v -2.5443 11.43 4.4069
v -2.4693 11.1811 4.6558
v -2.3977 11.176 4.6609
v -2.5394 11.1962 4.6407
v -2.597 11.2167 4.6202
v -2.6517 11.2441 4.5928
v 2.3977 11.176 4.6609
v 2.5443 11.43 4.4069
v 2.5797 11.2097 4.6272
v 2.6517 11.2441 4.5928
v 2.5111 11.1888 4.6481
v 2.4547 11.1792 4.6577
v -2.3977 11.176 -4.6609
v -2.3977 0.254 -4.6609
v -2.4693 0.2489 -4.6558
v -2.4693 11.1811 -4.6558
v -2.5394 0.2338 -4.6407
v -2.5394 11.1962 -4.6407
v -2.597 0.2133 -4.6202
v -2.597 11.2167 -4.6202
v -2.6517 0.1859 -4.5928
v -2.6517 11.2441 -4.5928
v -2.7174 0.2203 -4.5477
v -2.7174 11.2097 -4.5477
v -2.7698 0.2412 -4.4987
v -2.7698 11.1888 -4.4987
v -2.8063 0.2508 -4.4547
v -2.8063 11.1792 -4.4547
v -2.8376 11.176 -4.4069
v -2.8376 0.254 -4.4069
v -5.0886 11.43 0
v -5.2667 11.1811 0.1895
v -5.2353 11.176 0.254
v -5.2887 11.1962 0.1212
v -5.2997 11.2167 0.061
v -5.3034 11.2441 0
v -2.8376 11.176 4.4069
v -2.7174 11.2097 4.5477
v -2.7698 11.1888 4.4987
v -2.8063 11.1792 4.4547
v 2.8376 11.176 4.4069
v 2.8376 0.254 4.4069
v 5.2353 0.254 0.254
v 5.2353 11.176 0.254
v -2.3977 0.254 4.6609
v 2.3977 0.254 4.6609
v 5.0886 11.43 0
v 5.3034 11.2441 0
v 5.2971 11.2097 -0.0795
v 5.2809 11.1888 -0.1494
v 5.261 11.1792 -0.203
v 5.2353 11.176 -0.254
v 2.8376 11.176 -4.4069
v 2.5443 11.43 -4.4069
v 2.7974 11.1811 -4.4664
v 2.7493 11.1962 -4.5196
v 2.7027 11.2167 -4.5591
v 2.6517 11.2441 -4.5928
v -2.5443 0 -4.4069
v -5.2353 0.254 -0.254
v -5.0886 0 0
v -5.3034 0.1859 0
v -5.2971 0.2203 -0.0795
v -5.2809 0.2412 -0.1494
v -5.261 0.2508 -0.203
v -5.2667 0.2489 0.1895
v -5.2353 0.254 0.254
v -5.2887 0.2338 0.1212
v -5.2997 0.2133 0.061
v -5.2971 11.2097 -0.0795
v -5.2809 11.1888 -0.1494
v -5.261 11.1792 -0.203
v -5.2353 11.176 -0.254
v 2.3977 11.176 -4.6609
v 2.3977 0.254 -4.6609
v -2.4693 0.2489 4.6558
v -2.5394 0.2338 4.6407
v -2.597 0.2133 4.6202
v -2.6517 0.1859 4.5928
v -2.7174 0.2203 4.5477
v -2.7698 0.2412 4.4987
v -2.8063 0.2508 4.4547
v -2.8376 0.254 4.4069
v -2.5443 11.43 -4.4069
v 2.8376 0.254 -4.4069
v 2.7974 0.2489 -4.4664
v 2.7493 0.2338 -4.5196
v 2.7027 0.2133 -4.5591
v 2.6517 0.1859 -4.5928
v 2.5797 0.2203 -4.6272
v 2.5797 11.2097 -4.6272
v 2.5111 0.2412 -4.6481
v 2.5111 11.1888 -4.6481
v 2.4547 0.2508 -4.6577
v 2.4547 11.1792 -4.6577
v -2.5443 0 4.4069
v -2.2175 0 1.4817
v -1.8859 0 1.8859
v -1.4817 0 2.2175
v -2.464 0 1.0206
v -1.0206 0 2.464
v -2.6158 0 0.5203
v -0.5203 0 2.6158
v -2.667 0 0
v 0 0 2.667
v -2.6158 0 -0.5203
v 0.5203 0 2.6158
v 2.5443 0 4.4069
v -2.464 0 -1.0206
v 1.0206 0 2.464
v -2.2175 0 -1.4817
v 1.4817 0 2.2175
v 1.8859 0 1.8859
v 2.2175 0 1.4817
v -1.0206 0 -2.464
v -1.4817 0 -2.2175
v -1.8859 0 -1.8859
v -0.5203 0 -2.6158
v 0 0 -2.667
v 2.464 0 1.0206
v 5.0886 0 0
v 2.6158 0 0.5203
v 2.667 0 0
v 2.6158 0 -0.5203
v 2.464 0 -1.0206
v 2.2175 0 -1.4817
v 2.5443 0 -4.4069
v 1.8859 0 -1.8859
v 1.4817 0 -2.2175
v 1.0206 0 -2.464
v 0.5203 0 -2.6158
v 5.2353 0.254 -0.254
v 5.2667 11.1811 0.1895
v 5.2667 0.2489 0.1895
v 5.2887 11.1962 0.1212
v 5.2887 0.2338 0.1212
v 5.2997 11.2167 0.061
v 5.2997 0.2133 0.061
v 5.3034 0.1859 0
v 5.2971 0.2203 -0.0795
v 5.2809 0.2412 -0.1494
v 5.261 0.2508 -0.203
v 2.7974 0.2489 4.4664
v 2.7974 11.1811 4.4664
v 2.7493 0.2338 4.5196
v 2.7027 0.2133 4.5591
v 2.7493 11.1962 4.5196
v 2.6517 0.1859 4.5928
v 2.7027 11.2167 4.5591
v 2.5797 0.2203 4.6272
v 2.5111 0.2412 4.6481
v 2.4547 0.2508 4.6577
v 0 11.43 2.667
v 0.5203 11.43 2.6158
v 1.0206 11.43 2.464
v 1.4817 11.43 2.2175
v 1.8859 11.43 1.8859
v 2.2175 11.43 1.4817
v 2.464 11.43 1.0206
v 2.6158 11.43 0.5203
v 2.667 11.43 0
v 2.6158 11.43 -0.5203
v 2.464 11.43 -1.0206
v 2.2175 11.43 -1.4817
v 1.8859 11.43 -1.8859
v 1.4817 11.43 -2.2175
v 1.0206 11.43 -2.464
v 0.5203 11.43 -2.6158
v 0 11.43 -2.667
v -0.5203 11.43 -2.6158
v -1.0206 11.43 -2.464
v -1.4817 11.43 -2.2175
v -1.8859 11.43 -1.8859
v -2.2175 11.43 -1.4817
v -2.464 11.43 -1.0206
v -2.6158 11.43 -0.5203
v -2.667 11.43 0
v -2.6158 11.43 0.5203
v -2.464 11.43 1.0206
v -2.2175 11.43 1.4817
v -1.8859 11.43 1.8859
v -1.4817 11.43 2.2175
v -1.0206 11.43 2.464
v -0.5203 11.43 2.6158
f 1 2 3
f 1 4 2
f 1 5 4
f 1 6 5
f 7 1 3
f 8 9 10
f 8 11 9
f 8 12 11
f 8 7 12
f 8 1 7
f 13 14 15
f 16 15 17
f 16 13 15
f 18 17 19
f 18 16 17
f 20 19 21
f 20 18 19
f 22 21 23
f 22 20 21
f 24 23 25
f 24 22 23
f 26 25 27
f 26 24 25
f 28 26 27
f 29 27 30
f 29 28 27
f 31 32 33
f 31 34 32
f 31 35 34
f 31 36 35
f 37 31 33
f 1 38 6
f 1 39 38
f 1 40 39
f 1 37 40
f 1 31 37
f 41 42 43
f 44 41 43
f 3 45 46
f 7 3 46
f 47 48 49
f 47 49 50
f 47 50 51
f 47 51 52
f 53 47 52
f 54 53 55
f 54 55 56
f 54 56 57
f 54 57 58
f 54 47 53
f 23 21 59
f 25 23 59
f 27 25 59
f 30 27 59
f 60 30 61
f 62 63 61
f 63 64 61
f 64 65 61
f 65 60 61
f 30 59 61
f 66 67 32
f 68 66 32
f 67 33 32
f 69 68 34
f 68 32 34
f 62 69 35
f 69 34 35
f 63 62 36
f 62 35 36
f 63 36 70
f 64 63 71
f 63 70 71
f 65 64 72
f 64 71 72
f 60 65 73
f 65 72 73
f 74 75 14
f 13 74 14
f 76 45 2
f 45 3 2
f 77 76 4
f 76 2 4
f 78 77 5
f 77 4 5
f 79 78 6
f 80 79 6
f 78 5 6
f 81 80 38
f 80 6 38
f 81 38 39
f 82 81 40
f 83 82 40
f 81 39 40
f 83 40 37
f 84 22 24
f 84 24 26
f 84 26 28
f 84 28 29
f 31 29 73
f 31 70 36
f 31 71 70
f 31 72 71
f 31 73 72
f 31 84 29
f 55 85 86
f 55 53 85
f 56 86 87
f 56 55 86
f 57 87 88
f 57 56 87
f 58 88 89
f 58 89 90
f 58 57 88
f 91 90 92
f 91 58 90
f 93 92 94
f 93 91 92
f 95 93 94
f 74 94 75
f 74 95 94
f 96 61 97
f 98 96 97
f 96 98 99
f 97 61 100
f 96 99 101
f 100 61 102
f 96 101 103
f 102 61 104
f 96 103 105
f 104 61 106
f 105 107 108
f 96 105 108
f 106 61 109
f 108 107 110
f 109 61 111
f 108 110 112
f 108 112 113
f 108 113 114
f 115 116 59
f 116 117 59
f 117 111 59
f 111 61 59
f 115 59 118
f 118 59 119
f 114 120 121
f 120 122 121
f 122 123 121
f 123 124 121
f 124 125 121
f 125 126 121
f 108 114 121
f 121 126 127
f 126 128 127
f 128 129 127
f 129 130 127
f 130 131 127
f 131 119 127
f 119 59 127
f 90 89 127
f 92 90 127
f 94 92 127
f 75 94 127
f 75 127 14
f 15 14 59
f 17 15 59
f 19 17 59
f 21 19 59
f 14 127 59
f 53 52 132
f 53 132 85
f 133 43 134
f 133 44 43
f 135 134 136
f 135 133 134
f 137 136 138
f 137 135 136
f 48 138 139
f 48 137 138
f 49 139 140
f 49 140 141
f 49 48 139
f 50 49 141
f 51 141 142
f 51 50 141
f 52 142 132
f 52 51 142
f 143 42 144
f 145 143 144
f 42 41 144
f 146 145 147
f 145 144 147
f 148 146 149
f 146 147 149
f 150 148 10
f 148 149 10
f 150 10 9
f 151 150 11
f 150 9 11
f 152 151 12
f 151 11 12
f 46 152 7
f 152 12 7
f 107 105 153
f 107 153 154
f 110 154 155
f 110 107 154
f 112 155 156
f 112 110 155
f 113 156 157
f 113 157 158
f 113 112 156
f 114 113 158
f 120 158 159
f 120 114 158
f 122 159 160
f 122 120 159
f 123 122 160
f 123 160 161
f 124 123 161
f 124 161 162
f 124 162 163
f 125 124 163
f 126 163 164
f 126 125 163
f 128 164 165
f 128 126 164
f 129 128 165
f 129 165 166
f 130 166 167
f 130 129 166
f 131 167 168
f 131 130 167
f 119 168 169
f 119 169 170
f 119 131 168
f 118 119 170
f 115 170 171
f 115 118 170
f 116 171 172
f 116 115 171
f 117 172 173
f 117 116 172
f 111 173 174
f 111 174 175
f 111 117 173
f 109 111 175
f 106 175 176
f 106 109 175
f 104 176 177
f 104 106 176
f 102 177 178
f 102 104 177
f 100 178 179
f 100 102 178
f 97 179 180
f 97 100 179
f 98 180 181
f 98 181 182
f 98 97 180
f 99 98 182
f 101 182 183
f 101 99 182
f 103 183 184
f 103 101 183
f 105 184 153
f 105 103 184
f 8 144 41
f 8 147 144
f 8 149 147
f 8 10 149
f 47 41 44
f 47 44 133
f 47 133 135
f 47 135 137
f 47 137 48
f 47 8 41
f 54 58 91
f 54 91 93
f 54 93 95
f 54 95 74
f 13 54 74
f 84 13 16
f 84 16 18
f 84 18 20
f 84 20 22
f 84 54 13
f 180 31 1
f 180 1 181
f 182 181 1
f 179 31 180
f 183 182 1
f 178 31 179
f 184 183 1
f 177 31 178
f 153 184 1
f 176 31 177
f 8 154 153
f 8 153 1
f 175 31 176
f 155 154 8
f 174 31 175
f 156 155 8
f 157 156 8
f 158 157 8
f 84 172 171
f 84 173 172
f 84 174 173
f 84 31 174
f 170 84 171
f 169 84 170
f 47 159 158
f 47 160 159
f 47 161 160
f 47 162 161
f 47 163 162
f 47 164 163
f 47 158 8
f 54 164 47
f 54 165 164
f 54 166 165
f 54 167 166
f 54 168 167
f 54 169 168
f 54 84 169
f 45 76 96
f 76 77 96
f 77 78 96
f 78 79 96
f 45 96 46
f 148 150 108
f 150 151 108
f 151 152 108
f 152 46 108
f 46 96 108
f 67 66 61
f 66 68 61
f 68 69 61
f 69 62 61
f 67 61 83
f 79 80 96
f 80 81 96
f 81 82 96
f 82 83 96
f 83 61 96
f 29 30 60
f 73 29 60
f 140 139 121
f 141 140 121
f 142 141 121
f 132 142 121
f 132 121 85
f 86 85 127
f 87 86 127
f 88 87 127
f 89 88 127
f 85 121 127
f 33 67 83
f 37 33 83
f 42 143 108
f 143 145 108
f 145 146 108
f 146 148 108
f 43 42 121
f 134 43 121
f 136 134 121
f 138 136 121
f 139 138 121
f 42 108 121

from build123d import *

# Parameters (mm, degrees)
SKETCH1_R           = 2.667
BOSS_EXTRUDE1_DEPTH = 11.43
CHAMFER1_SIZE       = 0.254
FILLET1_R           = 0.508


with BuildPart() as part:
    # Sketch1 → Boss-Extrude1 (new body)
    with BuildSketch(Plane(origin=(0, 0, 0), x_dir=(1, 0, 0), z_dir=(0, 1, 0))):
        Polygon((2.69097187, -4.6609), (5.381943739, 0), (2.69097187, 4.6609), (-2.69097187, 4.6609), (-5.381943739, 0), (-2.69097187, -4.6609), align=None)
        with Locations(Location((0, 0, 0), (0, 0, 270))):
            Circle(SKETCH1_R, mode=Mode.SUBTRACT)
    extrude(amount=BOSS_EXTRUDE1_DEPTH)

    # Chamfer1
    chamfer1_edges = [part.edges().sort_by_distance(p)[0] for p in [
        (4.036457804, 11.43, -2.33045),
        (0, 11.43, -4.6609),
        (-4.036457804, 11.43, -2.33045),
        (-4.036457804, 11.43, 2.33045),
        (0, 11.43, 4.6609),
        (-4.036457804, 0, 2.33045),
        (-4.036457804, 0, -2.33045),
        (0, 0, -4.6609),
        (4.036457804, 0, -2.33045),
        (4.036457804, 0, 2.33045),
        (0, 0, 4.6609),
        (4.036457804, 11.43, 2.33045),
    ]]
    chamfer(chamfer1_edges, length=CHAMFER1_SIZE)

    # Fillet1
    fillet1_edges = [part.edges().sort_by_distance(p)[0] for p in [
        (5.381943739, 5.715, 0),
        (2.69097187, 5.715, 4.6609),
        (2.69097187, 5.715, -4.6609),
        (-2.69097187, 5.715, -4.6609),
        (-5.381943739, 5.715, 0),
        (-2.69097187, 5.715, 4.6609),
    ]]
    fillet(fillet1_edges, radius=FILLET1_R)


solid = part.part
